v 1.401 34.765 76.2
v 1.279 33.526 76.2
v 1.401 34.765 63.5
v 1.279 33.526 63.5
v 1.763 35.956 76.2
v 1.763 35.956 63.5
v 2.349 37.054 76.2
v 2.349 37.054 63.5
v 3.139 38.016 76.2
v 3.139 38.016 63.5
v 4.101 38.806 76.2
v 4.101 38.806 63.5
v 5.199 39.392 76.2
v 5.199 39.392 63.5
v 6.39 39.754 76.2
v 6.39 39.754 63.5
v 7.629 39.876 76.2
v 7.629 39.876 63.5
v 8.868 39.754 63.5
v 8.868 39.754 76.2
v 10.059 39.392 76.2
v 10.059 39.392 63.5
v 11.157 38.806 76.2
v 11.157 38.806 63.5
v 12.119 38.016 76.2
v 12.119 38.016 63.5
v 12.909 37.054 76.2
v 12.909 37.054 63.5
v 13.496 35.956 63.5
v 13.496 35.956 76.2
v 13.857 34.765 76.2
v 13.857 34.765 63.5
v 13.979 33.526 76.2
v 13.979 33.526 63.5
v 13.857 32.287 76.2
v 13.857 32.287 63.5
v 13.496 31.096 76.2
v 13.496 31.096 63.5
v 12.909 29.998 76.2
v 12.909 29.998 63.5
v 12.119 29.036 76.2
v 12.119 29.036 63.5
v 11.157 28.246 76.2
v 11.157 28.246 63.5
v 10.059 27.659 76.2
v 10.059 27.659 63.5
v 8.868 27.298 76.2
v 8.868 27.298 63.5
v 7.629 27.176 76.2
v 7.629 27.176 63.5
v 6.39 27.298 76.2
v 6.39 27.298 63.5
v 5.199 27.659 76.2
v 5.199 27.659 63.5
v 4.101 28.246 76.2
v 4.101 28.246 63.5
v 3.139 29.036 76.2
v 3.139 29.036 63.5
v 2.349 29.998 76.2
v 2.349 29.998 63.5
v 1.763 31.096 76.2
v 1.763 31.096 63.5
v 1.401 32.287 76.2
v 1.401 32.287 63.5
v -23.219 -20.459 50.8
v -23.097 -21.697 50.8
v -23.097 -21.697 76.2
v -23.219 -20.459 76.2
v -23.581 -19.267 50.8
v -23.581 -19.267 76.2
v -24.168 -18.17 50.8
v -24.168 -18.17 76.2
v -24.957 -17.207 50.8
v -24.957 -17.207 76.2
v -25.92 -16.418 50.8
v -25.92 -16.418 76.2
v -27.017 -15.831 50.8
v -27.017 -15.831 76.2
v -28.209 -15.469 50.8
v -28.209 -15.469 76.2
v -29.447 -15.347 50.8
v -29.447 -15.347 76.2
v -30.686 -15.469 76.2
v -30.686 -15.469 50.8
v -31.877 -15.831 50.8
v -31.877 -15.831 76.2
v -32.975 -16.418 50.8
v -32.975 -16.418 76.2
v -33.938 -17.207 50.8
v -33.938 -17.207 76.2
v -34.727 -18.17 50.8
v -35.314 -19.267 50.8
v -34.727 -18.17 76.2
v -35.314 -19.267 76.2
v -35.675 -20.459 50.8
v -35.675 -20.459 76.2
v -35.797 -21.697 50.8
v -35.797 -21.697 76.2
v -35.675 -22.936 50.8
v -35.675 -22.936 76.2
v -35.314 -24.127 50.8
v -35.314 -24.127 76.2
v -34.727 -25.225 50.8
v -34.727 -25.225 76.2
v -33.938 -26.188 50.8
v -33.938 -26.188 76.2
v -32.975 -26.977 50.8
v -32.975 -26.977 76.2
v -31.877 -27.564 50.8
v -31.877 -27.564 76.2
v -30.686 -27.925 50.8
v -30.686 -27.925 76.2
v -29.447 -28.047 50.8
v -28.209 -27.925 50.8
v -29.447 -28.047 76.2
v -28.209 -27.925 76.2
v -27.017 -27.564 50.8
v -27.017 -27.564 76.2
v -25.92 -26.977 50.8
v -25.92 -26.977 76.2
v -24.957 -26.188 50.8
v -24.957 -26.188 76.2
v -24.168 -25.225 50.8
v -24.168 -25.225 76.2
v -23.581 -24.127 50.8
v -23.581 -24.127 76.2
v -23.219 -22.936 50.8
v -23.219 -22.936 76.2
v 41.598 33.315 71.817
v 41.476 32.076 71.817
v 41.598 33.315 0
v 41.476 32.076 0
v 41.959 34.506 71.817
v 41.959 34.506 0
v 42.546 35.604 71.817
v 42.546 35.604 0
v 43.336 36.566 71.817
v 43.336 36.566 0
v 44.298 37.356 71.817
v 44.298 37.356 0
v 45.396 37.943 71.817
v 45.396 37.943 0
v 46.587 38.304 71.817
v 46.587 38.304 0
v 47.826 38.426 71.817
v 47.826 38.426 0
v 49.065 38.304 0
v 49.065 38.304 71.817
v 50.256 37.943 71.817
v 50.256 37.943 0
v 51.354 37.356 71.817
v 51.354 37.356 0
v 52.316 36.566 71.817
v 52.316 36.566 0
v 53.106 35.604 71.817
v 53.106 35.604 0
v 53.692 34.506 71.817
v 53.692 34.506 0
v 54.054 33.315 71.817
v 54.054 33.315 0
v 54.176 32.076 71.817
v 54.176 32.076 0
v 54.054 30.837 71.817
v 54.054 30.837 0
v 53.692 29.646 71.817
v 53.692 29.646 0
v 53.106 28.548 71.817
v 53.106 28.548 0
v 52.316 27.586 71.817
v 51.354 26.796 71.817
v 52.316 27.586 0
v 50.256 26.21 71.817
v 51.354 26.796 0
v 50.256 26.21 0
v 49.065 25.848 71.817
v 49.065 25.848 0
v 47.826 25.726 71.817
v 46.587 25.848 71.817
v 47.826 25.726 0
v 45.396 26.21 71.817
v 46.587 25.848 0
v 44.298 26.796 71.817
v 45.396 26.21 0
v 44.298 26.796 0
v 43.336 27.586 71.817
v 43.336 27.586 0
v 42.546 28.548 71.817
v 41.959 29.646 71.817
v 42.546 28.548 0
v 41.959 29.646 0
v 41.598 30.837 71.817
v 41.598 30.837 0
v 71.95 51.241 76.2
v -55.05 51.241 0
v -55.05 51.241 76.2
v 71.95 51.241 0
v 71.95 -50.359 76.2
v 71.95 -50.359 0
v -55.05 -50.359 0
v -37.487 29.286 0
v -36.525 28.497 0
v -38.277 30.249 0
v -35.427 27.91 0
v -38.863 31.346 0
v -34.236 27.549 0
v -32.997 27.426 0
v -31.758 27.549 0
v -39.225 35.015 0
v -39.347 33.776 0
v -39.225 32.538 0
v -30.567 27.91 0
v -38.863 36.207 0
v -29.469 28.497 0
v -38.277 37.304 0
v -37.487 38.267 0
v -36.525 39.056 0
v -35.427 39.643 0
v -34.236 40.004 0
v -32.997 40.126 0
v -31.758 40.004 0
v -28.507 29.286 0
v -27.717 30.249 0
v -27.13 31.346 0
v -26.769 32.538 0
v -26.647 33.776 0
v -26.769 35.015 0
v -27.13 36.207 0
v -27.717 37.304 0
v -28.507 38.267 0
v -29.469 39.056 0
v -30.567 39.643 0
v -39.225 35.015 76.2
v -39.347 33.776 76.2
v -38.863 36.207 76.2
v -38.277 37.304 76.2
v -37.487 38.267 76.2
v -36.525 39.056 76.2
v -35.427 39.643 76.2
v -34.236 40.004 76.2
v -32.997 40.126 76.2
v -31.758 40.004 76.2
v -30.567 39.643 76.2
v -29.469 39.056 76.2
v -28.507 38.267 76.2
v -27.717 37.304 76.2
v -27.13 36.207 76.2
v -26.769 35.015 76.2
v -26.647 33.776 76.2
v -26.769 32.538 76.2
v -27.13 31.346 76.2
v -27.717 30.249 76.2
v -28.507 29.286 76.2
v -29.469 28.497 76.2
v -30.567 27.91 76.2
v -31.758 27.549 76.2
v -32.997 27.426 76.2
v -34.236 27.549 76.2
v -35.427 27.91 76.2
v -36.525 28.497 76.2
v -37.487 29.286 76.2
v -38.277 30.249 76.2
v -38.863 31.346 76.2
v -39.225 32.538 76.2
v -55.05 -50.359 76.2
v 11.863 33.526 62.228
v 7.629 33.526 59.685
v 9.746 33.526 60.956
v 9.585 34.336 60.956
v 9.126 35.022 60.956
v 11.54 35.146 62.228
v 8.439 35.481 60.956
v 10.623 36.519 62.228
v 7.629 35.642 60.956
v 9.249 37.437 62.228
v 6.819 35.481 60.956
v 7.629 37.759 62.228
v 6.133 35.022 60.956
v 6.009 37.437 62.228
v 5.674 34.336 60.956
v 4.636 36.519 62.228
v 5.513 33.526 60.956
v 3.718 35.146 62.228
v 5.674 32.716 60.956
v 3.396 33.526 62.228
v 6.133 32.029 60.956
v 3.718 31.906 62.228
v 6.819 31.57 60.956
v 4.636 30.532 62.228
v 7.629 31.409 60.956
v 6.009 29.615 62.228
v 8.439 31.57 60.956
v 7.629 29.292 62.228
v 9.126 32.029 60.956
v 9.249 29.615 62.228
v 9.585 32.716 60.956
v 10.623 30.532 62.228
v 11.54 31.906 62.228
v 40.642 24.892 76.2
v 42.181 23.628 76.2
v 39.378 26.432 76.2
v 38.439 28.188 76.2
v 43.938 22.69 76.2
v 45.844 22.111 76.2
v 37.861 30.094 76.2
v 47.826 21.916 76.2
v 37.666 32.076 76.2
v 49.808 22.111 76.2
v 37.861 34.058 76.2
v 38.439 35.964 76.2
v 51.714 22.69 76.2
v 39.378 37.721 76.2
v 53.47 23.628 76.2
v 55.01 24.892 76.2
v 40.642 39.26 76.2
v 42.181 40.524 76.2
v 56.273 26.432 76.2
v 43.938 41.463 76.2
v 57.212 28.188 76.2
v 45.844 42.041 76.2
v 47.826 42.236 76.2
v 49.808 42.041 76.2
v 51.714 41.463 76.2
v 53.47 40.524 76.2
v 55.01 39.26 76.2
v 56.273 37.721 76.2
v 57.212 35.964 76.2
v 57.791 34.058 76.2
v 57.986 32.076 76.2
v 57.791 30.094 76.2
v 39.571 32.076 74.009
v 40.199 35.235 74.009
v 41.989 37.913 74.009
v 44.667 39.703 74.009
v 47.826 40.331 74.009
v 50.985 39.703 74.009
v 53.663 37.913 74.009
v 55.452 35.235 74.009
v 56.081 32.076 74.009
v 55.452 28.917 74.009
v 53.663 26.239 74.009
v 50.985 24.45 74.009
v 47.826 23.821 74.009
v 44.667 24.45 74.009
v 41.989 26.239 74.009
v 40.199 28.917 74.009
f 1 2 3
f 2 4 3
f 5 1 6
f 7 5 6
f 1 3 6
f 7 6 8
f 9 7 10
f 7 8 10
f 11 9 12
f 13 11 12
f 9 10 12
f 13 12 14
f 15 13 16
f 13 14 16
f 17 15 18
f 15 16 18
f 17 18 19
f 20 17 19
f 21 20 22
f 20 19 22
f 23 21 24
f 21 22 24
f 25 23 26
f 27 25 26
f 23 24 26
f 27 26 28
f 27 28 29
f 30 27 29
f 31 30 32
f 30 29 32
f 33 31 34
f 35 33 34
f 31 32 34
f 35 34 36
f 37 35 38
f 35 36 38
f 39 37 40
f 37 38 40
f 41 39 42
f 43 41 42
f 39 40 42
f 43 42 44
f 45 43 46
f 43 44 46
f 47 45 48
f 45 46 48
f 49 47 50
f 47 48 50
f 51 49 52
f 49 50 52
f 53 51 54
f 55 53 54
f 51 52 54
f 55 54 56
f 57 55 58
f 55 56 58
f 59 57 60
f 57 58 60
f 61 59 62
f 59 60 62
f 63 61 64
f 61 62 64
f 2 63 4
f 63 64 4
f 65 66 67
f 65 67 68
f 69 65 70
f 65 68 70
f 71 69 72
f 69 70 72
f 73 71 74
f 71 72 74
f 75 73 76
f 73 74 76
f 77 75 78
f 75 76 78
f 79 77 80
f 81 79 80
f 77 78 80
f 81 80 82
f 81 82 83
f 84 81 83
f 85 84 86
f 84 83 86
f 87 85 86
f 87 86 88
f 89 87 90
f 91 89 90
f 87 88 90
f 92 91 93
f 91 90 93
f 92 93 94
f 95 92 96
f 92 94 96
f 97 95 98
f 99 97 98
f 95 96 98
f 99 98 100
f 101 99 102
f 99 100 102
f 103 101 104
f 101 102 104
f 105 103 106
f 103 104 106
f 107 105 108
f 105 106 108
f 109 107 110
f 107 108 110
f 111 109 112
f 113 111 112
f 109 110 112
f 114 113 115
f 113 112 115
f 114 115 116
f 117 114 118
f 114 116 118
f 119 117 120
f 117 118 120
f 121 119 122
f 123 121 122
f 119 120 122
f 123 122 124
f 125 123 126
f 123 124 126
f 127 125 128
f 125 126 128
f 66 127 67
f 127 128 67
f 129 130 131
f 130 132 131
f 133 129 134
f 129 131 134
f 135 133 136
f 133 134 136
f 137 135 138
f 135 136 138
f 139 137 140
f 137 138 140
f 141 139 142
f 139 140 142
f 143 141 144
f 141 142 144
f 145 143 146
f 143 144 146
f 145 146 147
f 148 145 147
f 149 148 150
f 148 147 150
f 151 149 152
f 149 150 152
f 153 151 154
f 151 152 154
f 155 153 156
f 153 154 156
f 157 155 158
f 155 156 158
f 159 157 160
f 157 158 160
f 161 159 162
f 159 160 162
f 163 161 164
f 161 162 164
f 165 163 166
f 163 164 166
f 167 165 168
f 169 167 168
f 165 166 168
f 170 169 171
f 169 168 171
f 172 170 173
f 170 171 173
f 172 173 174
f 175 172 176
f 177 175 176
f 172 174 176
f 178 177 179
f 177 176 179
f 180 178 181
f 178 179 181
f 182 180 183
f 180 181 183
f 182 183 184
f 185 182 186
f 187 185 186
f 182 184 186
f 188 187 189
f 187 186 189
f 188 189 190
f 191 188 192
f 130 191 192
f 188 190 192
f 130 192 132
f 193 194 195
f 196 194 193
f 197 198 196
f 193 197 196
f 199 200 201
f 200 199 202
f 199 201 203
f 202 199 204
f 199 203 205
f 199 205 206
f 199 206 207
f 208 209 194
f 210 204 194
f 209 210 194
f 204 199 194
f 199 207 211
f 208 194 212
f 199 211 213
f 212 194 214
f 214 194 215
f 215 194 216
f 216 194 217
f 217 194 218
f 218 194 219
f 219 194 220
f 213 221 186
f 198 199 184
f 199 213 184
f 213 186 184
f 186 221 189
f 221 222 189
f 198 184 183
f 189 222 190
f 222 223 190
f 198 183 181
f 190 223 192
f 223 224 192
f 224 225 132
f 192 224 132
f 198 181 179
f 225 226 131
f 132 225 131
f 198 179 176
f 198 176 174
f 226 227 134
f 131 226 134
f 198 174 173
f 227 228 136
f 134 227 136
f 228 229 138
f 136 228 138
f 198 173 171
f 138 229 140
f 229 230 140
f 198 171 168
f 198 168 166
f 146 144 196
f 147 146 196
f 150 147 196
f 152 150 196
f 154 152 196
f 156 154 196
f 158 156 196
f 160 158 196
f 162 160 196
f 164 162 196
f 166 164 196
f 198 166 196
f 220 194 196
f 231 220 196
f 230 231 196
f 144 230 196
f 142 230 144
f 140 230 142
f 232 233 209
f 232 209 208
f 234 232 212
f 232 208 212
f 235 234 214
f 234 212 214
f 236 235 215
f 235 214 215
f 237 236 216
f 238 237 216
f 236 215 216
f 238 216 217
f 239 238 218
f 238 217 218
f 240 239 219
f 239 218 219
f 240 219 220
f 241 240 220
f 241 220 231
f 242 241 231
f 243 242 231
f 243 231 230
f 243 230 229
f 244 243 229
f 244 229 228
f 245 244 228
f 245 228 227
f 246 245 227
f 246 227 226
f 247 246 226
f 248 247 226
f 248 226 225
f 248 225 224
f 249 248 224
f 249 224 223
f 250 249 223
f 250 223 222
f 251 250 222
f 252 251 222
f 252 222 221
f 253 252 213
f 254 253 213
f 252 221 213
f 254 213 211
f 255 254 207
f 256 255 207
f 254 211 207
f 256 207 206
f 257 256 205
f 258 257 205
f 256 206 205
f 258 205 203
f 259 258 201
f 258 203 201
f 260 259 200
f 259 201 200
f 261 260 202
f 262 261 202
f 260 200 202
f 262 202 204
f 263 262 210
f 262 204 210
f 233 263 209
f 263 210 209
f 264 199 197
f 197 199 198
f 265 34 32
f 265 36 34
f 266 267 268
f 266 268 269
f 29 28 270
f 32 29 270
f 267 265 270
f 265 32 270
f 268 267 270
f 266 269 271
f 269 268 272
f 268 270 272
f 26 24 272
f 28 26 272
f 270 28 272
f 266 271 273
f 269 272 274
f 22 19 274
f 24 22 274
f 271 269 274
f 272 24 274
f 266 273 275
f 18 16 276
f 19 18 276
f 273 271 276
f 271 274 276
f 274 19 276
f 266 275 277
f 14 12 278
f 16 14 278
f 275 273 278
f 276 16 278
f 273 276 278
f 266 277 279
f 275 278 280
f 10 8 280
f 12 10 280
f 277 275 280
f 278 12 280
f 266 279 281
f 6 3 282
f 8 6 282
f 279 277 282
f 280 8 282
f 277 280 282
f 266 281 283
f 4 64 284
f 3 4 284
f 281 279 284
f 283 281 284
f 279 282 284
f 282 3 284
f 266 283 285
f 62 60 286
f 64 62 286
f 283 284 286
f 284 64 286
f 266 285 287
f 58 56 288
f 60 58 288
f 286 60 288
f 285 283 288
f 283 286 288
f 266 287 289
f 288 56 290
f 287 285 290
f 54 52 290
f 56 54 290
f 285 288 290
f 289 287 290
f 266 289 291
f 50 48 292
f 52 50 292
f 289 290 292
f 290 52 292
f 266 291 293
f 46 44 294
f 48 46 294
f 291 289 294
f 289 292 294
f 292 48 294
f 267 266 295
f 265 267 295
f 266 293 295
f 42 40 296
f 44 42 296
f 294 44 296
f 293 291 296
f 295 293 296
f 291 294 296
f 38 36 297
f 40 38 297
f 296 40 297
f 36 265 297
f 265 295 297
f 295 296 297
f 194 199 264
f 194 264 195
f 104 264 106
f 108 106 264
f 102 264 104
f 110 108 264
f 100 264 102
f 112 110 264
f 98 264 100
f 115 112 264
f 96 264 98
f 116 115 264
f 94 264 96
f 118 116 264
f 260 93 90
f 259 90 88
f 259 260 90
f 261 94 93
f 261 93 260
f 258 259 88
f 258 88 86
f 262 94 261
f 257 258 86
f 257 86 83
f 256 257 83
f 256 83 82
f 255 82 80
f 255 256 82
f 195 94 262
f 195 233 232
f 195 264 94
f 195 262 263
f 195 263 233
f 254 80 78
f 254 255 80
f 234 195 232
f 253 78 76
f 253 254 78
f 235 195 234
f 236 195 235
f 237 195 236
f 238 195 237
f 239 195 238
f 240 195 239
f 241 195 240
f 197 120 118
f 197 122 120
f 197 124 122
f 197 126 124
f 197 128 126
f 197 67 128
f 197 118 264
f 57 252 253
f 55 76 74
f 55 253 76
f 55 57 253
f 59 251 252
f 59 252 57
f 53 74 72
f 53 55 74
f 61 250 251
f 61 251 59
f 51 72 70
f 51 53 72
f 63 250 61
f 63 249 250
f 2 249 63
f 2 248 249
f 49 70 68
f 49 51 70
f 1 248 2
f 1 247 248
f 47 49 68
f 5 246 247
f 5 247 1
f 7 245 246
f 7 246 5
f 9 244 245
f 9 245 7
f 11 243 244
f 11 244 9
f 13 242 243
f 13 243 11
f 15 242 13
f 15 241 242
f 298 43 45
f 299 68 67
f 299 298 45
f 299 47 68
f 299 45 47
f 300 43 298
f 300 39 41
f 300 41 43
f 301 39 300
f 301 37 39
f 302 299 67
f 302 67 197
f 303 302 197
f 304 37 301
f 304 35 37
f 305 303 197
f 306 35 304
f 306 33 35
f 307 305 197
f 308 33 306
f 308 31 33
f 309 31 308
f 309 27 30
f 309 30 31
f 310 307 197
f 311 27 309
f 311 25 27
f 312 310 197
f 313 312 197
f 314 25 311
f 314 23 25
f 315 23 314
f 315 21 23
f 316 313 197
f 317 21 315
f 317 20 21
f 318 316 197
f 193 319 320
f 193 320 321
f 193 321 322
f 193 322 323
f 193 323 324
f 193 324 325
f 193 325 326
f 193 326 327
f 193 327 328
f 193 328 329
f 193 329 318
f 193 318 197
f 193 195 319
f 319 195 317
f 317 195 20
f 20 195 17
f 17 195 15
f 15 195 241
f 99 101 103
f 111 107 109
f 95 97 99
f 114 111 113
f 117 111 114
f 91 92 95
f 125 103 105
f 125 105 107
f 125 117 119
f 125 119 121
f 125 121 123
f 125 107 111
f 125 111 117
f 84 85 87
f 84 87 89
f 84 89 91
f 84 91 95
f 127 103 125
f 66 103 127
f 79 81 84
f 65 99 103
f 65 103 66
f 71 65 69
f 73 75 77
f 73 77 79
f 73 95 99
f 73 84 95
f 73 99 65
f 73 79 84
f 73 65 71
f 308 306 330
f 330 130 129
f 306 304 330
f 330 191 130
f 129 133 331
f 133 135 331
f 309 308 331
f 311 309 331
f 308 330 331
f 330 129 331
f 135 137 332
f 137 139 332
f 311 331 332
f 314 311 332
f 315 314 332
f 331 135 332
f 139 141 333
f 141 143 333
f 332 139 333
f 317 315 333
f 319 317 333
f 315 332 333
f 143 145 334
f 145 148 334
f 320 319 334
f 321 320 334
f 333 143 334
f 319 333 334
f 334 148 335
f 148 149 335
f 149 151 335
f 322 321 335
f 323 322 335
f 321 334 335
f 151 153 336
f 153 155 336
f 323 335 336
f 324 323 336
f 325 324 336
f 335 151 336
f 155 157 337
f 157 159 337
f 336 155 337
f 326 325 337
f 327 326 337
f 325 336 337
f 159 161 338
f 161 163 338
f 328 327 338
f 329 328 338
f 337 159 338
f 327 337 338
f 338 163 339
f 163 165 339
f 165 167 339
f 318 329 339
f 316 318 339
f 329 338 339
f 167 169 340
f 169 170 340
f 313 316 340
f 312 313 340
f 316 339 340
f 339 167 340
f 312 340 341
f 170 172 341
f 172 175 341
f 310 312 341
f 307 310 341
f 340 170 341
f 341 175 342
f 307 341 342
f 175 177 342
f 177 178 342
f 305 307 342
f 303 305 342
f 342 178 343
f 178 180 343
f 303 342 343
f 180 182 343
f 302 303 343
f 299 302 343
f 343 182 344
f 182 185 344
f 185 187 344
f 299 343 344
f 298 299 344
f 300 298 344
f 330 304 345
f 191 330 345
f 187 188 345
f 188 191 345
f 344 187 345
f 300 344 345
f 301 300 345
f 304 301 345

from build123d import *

# Parameters (mm, degrees)
F0_W           = 127
F0_H           = 101.6
F1_DEPTH       = 76.2
F3_D           = 12.7
F4_D           = 12.7
F4_DEPTH       = 12.7
F4_TIP         = 3.8154649308
F5_D           = 12.7
F5_CSINK_D     = 20.32
F5_CSINK_ANGLE = 82
F6_R           = 6.35
F7_DEPTH       = 25.4


with BuildPart() as f1:
    # F0 (on Top) → F1 (new body)
    with BuildSketch(Plane.XY):
        with Locations((8.4503423423, 0.4407010946)):
            Rectangle(F0_W, F0_H)
    extrude(amount=F1_DEPTH)

    # F3 (through all)
    with Locations(Plane.XY.offset(76.2)):
        with Locations((-32.9967327416, 33.7764918804)):
            Hole(F3_D / 2)

    # F4
    with Locations(Plane.XY.offset(76.2)):
        with Locations((7.6293125749, 33.5257202387)):
            Hole(F4_D / 2, depth=F4_DEPTH)
            with Locations((0, 0, -(F4_DEPTH + F4_TIP / 2))):  # 118° drill point
                Cone(0, F4_D / 2, F4_TIP, mode=Mode.SUBTRACT)

    # F5 (through all)
    with Locations(Plane.XY.offset(76.2)):
        with Locations((47.8257350624, 32.076139003)):
            CounterSinkHole(F5_D / 2, F5_CSINK_D / 2, counter_sink_angle=F5_CSINK_ANGLE)

    # F6 (on face) → F7 (cut)
    with BuildSketch(Plane.XY.offset(76.2)):
        with Locations((-29.4474586844, -21.6974113137)):
            Circle(F6_R)
    extrude(amount=-F7_DEPTH, mode=Mode.SUBTRACT)


solid = f1.part
